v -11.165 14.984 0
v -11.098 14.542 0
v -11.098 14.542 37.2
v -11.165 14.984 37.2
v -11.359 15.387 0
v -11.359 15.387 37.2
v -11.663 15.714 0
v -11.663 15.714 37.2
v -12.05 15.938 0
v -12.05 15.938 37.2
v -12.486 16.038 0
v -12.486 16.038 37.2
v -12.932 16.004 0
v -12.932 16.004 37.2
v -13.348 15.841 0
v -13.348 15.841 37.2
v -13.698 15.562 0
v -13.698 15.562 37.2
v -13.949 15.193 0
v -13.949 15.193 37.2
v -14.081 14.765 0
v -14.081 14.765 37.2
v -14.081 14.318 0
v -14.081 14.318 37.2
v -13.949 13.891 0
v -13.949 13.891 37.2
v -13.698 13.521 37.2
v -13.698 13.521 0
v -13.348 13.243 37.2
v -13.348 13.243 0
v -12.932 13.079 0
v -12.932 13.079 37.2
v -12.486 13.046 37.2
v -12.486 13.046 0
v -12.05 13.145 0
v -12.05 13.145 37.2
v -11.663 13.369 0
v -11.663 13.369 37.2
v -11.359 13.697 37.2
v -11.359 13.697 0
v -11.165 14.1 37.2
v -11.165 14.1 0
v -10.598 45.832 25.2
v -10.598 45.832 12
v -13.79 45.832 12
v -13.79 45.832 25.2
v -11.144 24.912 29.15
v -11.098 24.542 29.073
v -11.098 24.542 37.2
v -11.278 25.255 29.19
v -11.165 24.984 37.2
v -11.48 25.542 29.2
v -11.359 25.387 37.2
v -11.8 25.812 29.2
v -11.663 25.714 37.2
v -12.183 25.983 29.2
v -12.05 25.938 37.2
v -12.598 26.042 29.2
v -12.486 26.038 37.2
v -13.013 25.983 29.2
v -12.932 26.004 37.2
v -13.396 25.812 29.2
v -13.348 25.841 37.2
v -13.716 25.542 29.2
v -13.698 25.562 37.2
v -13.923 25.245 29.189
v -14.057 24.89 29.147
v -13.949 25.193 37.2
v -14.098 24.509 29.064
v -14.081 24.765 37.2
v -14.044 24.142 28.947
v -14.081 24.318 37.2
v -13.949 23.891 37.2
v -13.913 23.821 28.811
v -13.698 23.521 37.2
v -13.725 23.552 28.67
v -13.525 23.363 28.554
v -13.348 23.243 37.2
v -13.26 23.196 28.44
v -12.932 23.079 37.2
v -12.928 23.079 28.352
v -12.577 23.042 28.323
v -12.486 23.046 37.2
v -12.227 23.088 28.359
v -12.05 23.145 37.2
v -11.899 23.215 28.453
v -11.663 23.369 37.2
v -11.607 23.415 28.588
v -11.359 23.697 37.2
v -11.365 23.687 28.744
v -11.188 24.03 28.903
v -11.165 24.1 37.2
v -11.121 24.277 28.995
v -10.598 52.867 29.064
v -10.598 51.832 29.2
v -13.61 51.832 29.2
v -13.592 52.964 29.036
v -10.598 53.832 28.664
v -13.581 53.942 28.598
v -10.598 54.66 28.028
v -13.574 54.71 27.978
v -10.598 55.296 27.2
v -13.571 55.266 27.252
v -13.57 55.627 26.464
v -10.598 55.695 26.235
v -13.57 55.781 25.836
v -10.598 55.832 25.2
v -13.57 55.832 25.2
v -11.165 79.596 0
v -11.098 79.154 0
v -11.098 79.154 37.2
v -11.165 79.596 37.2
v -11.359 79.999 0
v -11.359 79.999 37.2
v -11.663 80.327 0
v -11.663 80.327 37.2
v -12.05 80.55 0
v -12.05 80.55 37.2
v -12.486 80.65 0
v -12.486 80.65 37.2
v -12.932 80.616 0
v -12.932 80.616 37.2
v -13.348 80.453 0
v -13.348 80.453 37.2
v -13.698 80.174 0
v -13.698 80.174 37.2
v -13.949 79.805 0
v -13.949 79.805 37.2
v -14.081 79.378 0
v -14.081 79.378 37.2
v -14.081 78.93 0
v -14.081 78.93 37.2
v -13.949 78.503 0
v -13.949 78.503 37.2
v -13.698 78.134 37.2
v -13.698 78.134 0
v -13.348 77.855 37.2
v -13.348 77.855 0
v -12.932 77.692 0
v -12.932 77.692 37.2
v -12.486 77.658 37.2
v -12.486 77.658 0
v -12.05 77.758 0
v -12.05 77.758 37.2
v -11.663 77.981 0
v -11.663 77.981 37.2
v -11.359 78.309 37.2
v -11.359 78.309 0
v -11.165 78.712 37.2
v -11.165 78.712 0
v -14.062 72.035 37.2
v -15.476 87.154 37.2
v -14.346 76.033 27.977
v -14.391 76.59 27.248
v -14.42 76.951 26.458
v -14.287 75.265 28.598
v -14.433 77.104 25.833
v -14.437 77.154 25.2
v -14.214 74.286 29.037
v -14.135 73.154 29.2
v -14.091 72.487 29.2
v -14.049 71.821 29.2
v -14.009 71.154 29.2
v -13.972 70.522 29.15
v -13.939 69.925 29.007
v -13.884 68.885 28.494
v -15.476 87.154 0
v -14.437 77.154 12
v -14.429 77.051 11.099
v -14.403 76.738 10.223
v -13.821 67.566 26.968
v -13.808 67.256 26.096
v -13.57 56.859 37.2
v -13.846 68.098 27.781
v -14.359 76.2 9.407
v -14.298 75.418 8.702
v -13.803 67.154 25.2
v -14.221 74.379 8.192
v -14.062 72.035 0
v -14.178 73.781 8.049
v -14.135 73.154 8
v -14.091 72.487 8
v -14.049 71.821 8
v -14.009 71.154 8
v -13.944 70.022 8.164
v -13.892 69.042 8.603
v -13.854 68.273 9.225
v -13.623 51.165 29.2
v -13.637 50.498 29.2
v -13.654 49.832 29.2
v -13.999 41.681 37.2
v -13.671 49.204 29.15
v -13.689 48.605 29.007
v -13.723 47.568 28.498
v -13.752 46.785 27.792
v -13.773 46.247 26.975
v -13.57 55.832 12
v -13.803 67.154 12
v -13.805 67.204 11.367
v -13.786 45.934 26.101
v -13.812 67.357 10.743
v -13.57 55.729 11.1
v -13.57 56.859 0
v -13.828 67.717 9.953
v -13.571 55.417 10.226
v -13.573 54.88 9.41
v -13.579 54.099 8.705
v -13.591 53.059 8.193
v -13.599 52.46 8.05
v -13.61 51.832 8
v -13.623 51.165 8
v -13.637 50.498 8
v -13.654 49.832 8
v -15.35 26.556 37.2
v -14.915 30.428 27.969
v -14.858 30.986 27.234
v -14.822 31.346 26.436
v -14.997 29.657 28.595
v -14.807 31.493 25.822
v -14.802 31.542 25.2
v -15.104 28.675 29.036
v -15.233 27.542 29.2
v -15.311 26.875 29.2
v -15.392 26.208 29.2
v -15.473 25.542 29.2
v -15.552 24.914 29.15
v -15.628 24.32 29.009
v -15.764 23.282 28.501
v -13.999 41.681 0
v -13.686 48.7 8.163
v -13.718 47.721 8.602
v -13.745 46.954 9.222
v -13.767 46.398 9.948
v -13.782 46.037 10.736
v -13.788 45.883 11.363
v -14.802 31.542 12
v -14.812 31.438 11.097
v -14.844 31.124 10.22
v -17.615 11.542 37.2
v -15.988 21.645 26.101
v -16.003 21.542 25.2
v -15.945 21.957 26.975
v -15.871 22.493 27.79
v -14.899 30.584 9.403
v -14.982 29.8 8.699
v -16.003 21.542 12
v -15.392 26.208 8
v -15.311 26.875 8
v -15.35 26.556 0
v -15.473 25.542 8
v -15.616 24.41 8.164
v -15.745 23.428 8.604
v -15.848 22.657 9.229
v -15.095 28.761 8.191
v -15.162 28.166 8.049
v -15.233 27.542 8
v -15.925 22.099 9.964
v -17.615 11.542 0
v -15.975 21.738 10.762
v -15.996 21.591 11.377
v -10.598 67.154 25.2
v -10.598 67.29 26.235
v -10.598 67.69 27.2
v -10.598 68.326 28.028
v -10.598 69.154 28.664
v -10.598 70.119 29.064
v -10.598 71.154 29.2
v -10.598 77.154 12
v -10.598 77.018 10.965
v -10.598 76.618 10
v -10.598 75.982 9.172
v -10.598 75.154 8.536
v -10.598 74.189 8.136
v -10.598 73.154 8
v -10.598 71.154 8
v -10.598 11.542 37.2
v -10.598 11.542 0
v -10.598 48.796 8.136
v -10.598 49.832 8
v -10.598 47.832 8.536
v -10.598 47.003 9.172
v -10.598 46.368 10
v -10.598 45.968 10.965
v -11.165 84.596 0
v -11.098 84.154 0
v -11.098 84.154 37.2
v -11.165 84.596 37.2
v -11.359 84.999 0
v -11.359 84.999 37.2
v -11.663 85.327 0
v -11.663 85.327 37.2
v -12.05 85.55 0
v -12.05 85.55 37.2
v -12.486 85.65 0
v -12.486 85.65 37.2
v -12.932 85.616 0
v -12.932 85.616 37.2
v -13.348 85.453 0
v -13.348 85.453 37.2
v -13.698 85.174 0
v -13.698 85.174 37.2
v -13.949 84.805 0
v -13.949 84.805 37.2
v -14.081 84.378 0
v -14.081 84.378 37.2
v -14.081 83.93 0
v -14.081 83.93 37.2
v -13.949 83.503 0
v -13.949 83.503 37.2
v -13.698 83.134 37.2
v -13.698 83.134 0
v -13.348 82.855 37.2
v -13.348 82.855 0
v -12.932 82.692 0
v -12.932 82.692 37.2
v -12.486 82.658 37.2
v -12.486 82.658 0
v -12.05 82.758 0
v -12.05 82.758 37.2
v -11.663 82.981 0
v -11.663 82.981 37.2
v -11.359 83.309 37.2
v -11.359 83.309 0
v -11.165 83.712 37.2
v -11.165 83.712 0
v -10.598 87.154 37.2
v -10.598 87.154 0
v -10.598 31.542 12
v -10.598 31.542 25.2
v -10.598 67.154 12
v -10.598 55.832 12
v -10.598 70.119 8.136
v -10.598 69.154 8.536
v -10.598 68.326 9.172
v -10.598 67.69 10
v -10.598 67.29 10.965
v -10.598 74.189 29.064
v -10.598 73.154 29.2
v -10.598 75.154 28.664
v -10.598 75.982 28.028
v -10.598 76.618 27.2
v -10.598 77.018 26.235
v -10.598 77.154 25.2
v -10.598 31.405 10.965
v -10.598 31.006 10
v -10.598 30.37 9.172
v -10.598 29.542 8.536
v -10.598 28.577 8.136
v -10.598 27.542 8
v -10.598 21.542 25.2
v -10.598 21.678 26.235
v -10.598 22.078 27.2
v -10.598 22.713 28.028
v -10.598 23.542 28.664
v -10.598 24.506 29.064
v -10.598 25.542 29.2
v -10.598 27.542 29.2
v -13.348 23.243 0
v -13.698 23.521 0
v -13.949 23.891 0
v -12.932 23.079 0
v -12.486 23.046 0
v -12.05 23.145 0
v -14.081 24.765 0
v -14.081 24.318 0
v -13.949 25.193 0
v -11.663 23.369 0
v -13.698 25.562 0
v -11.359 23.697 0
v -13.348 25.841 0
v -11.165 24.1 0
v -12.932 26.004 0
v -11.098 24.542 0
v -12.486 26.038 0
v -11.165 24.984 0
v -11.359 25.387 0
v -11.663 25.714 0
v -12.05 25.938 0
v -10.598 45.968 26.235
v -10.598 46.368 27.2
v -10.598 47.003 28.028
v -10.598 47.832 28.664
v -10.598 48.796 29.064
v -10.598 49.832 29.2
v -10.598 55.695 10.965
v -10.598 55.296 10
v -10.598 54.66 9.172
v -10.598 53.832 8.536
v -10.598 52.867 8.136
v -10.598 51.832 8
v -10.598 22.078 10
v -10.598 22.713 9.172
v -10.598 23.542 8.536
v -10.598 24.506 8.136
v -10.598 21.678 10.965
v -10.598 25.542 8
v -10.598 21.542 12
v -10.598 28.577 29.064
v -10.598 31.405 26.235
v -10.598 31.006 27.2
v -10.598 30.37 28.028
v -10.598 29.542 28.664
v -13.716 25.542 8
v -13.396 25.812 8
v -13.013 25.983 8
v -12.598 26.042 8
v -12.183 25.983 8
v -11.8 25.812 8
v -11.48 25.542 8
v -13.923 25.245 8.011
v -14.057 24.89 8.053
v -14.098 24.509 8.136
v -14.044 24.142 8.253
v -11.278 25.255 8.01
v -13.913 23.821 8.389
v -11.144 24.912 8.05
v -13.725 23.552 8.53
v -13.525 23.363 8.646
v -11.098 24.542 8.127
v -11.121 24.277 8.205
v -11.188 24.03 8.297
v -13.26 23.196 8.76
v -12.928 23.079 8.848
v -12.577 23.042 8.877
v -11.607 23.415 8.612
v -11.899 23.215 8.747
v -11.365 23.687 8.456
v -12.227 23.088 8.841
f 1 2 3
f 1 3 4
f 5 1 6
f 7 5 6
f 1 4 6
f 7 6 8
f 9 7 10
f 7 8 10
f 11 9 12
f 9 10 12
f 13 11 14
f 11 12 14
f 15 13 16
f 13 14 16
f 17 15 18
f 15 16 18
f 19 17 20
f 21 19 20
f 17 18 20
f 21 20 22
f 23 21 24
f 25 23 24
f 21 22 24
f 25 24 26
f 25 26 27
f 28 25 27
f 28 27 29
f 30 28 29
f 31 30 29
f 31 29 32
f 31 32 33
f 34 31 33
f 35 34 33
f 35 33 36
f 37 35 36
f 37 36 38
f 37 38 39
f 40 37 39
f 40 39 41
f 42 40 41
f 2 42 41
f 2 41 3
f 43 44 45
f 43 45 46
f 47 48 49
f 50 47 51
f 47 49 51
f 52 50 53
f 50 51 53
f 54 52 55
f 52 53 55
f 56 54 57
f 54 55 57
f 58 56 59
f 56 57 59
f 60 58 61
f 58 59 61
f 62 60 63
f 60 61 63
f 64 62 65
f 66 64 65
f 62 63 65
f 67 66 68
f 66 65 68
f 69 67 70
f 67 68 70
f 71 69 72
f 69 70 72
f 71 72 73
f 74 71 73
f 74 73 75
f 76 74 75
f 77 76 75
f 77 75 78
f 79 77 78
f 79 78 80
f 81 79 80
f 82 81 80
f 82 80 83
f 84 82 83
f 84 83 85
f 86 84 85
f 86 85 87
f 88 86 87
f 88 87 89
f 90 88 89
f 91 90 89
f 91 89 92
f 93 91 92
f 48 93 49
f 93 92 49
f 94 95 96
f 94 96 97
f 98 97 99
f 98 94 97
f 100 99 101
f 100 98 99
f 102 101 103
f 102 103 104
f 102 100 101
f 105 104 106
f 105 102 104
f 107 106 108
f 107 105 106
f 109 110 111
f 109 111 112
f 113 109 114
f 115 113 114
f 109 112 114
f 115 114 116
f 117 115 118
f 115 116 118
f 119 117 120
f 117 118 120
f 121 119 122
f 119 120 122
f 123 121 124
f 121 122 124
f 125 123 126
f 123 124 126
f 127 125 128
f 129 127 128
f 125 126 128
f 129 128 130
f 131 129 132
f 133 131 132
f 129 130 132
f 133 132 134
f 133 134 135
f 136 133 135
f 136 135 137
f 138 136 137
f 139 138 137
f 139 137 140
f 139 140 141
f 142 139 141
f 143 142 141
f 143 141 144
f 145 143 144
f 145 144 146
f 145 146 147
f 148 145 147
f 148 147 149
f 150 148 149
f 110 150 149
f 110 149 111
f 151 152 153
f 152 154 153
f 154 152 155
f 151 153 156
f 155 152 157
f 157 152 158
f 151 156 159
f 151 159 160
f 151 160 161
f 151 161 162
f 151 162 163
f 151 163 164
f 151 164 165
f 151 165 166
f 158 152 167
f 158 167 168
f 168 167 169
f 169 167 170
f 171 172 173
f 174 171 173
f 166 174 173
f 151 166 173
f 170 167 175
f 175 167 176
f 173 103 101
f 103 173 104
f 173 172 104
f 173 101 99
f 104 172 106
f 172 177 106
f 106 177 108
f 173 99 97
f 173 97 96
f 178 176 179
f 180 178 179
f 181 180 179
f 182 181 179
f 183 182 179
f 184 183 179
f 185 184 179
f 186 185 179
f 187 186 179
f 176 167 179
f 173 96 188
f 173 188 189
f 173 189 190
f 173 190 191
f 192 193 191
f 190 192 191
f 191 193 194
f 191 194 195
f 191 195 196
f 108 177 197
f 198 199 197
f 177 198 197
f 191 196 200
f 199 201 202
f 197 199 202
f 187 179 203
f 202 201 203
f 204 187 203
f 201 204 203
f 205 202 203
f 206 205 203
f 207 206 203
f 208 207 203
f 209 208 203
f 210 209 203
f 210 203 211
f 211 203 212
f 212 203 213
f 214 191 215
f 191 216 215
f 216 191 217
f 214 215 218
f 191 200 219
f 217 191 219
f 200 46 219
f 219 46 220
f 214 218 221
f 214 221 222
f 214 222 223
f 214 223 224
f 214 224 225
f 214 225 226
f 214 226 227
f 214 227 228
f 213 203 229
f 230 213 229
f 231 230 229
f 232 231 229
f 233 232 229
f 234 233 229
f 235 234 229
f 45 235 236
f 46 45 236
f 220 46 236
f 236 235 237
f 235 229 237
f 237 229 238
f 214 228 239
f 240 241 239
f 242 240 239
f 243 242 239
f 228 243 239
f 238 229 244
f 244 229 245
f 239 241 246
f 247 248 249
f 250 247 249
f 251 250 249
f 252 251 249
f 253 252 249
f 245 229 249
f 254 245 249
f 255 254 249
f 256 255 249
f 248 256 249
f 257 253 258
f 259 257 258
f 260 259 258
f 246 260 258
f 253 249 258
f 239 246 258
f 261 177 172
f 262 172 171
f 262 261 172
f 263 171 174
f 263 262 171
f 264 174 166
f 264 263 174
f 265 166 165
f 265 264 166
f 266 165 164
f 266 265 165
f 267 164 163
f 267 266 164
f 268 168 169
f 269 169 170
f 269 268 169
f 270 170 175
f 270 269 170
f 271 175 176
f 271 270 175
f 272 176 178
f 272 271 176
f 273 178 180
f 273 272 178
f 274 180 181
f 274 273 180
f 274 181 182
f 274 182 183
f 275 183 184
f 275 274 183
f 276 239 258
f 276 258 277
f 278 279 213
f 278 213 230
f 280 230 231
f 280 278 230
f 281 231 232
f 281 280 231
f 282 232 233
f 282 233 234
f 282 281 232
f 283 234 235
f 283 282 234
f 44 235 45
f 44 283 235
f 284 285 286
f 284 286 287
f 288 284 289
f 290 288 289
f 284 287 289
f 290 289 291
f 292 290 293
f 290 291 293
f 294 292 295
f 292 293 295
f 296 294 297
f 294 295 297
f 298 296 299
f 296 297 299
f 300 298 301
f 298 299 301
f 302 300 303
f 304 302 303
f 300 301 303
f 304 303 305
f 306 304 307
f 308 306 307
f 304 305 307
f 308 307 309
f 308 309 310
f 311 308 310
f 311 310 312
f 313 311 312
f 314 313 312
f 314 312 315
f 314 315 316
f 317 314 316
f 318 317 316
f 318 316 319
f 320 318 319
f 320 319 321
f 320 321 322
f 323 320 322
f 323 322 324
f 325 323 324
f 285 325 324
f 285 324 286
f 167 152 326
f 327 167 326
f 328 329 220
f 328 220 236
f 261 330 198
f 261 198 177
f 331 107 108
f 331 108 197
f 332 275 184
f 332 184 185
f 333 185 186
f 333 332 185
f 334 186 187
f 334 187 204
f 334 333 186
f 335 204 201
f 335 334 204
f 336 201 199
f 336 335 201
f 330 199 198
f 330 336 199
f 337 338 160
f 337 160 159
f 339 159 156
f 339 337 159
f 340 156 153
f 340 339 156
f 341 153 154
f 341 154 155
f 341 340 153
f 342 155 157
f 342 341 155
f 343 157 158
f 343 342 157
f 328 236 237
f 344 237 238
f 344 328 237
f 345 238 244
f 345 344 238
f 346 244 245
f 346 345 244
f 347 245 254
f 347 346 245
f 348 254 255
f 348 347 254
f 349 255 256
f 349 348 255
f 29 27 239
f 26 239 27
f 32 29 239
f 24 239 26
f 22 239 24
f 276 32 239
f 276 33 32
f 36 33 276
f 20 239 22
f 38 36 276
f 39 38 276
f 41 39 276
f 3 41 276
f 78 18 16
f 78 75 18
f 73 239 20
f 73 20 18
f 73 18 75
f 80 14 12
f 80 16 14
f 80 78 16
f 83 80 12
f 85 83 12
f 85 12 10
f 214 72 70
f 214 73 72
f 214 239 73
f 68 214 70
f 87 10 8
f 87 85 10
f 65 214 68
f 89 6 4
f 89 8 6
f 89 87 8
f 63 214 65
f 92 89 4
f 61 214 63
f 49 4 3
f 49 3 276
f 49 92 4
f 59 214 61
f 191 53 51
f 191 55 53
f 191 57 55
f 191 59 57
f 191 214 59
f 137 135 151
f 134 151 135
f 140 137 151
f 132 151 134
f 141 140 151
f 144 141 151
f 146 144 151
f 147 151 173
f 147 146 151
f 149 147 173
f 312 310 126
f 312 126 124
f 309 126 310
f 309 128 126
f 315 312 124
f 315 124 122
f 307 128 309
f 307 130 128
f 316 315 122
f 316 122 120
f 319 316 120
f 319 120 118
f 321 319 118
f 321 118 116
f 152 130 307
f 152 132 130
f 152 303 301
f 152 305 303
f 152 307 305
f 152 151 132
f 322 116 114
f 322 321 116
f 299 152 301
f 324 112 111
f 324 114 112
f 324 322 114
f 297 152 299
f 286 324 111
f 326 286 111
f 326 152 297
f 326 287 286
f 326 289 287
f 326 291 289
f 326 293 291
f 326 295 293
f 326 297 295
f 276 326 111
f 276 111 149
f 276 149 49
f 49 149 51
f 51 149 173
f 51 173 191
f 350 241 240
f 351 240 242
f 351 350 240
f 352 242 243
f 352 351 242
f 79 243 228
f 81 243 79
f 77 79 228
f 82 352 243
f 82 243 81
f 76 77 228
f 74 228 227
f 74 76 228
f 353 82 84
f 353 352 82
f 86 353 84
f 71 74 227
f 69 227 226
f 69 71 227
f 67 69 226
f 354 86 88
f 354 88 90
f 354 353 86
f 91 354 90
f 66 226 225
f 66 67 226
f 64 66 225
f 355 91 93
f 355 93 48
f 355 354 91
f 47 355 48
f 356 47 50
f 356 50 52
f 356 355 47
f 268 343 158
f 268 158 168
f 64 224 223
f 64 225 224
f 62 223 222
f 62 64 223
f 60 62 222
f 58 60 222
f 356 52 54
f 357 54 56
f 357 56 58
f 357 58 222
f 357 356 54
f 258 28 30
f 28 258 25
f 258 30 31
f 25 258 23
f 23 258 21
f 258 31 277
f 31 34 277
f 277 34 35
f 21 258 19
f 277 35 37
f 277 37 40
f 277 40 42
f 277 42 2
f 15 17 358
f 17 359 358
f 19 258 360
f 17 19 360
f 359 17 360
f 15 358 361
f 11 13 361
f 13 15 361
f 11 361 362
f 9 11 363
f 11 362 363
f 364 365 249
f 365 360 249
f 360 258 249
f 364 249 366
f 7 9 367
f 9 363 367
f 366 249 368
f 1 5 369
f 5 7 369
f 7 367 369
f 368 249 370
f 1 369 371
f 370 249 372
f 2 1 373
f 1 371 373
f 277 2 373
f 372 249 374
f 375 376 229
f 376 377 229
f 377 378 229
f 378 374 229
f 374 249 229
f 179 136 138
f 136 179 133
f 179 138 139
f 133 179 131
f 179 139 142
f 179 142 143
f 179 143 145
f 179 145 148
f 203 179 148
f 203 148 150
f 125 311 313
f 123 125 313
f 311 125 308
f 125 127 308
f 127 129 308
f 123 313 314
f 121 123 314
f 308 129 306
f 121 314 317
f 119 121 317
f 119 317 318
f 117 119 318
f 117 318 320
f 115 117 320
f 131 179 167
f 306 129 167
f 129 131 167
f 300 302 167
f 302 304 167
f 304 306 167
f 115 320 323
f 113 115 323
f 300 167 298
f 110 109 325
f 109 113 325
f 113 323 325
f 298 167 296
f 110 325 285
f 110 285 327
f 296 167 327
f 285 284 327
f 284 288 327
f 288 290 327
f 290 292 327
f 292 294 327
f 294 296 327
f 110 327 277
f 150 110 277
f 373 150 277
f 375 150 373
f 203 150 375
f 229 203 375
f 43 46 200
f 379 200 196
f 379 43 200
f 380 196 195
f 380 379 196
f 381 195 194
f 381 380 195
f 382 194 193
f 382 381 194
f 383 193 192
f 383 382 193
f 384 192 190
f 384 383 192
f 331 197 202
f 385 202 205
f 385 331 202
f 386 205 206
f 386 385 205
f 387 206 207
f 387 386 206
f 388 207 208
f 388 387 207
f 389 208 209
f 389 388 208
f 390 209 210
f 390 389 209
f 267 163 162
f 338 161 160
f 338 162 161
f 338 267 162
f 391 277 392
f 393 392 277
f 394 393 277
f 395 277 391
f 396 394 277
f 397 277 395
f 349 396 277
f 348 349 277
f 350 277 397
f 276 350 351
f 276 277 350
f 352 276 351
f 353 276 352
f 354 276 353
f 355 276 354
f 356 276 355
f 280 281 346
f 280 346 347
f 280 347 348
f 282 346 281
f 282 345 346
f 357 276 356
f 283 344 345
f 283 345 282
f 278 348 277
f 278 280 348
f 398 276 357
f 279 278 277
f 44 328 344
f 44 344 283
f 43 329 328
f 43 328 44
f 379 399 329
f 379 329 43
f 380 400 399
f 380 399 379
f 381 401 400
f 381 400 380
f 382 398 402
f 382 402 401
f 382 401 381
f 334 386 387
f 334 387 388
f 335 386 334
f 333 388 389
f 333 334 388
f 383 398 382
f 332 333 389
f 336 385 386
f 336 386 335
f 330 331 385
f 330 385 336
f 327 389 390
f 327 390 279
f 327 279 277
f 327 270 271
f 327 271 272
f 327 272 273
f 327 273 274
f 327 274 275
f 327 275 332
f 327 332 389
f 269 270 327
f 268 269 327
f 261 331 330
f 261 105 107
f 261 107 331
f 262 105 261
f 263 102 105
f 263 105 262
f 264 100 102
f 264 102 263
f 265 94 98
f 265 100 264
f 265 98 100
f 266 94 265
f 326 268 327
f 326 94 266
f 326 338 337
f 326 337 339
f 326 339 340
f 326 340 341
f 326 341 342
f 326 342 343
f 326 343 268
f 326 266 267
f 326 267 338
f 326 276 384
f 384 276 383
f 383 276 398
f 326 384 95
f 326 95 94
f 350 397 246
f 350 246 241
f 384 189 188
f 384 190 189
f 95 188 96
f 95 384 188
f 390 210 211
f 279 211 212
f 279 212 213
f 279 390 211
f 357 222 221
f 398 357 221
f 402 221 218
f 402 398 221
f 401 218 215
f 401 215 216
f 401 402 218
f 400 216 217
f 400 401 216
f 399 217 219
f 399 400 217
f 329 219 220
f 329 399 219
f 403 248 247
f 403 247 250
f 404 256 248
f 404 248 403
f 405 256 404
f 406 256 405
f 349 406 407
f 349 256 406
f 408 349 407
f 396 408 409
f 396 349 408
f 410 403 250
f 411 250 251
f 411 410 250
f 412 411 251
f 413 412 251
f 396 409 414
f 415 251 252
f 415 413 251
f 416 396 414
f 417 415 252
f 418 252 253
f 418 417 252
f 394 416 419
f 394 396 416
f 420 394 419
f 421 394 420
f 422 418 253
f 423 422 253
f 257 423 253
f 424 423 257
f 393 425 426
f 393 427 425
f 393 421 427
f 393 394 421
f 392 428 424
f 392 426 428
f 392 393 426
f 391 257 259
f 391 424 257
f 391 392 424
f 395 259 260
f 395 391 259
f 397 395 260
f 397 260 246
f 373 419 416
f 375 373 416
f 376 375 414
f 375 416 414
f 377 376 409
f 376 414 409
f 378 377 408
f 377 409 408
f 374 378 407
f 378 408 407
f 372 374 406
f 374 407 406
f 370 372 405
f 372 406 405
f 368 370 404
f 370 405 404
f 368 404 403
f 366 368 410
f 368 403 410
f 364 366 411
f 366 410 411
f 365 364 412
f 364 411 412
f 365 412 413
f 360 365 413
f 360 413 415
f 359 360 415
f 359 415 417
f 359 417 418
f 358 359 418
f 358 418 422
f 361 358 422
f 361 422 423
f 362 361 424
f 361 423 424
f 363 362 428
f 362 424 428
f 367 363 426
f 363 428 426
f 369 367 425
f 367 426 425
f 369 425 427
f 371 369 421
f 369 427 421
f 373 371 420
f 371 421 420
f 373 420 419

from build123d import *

# Parameters (mm, degrees)
RESSALTO_EXTRUS_O1_DEPTH = 37.2
FILETE3_R                = 10
FILETE4_R                = 10
ESBO_O3_W                = 64.493903811
ESBO_O3_H                = 22.028162523
CORTE_EXTRUS_O2_DEPTH    = 126.622328301
ESBO_O4_W                = 55.088928671
ESBO_O4_H                = 123.119514717
CORTE_EXTRUS_O3_DEPTH    = 126.622328159
ESBO_O5_W                = 12.155718474
ESBO_O5_H                = 25
CORTE_EXTRUS_O4_DEPTH    = 120.46824597
CORTE_EXTRUS_O5_DEPTH    = 96.020543125
ESBO_O7_R                = 1.5
CORTE_EXTRUS_O6_DEPTH    = 97.384450815


with BuildPart() as part:
    # Esboço1 → Ressalto-extrusão1 (new body)
    with BuildSketch(Plane.XY):
        with BuildLine():
            ThreePointArc((-10, 0), (0, -10), (10, 0))
            Line((10, 0), (20, 0))
            ThreePointArc((20, 0), (14.071698091, 40.495175194), (14.829943665, 81.414963086))
            ThreePointArc((14.829943665, 81.414963086), (11.193742071, 116.066691762), (-16.576524471, 95.024435265))
            Line((-16.576524471, 95.024435265), (-16.487894969, 94.437265709))
            Line((-16.487894969, 94.437265709), (-16.369382775, 93.652123615))
            ThreePointArc((-16.369382775, 93.652123615), (-13.756795166, 46.654405302), (-20, 0))
            Line((-20, 0), (-10, 0))
        make_face()
    extrude(amount=RESSALTO_EXTRUS_O1_DEPTH)

    # Filete3
    # the kernel refuses this fillet: 10 mm, written as the material it takes off along each edge
    with BuildSketch(Plane(origin=(20, 0, -29.463728433), x_dir=(-0.20232831186330175, 0.9793177493635794, 0), z_dir=(0, 0, 1))) as filete3_piece_1:
        with BuildLine():
            CenterArc((12.021201201, 9.997221658), FILETE3_R, 181.169168083, 87.480189)
            Line((2.023283119, 9.793177494), (1.823324757, 9.78909661))
            ThreePointArc((1.823324757, 9.78909661), (0.815778009, 4.937054409), (-0.19586355, 0.040465662))
            Line((-0.19586355, 0.040465662), (0.004714197, -0.199944433))
            ThreePointArc((0.004714197, -0.199944433), (5.892745687, -0.130541448), (11.780777177, -0.199944433))
            Line((11.780777177, -0.199944433), (11.785491373, 0))
        make_face()
    extrude(amount=96.127456867, mode=Mode.SUBTRACT)
    with BuildSketch(Plane(origin=(-20, 0, -29.463728433), x_dir=(1, 0, 0), z_dir=(0, 0, 1))) as filete3_piece_2:
        with BuildLine():
            CenterArc((12.222685959, 9.749854723), FILETE3_R, 169.67749742, 87.480189)
            Line((2.384538574, 11.541740887), (2.187775626, 11.57757861))
            ThreePointArc((2.187775626, 11.57757861), (1.06442773, 5.797282674), (-0.194855317, 0.045071116))
            Line((-0.194855317, 0.045071116), (0, -0.2))
            ThreePointArc((0, -0.2), (5, -0.2), (9.955546281, -0.194997094))
            Line((9.955546281, -0.194997094), (10, 0))
        make_face()
    extrude(amount=96.127456867, mode=Mode.SUBTRACT)

    # Filete4
    filete4_edges = [part.edges().sort_by_distance(p)[0] for p in [
        (10, 0, 18.6),
        (-10, 0, 18.6),
    ]]
    fillet(filete4_edges, radius=FILETE4_R)

    # Esboço3 → Corte-extrusão2 (cut, through all)
    with BuildSketch(Plane.XY.offset(37.2)):
        with Locations((-2.119172362, 0.527659626)):
            Rectangle(ESBO_O3_W, ESBO_O3_H)
    extrude(amount=-CORTE_EXTRUS_O2_DEPTH, mode=Mode.SUBTRACT)

    # Esboço4 → Corte-extrusão3 (cut, through all)
    with BuildSketch(Plane.XY.offset(37.2)):
        with Locations((16.946535692, 73.101498246)):
            Rectangle(ESBO_O4_W, ESBO_O4_H)
    extrude(amount=-CORTE_EXTRUS_O3_DEPTH, mode=Mode.SUBTRACT)

    # Esboço5 → Corte-extrusão4 (cut, through all)
    with BuildSketch(Plane.XY.offset(37.2)):
        with Locations((-16.675787881, 99.653989291)):
            Rectangle(ESBO_O5_W, ESBO_O5_H)
    extrude(amount=-CORTE_EXTRUS_O4_DEPTH, mode=Mode.SUBTRACT)

    # Esboço6 → Corte-extrusão5 (cut, through all)
    with BuildSketch(Plane(origin=(-10.597928644, 0, 0), x_dir=(0, 0, -1), z_dir=(1, 0, 0))):
        with BuildLine():
            Line((-25.2, 77.153989291), (-12, 77.153989291))
            ThreePointArc((-12, 77.153989291), (-9.171572875, 75.982416416), (-8, 73.153989291))
            Line((-8, 73.153989291), (-8, 71.153989291))
            ThreePointArc((-8, 71.153989291), (-9.171572875, 68.325562166), (-12, 67.153989291))
            Line((-12, 67.153989291), (-25.2, 67.153989291))
            ThreePointArc((-25.2, 67.153989291), (-28.028427125, 68.325562166), (-29.2, 71.153989291))
            Line((-29.2, 71.153989291), (-29.2, 73.153989291))
            ThreePointArc((-29.2, 73.153989291), (-28.028427125, 75.982416416), (-25.2, 77.153989291))
        make_face()
        with BuildLine():
            Line((-25.2, 55.831740887), (-12, 55.831740887))
            ThreePointArc((-12, 55.831740887), (-9.171572875, 54.660168012), (-8, 51.831740887))
            Line((-8, 51.831740887), (-8, 49.831740887))
            ThreePointArc((-8, 49.831740887), (-9.171572875, 47.003313762), (-12, 45.831740887))
            Line((-12, 45.831740887), (-25.2, 45.831740887))
            ThreePointArc((-25.2, 45.831740887), (-28.028427125, 47.003313762), (-29.2, 49.831740887))
            Line((-29.2, 49.831740887), (-29.2, 51.831740887))
            ThreePointArc((-29.2, 51.831740887), (-28.028427125, 54.660168012), (-25.2, 55.831740887))
        make_face()
        with BuildLine():
            Line((-25.2, 31.541740887), (-12, 31.541740887))
            ThreePointArc((-12, 31.541740887), (-9.171572875, 30.370168012), (-8, 27.541740887))
            Line((-8, 27.541740887), (-8, 25.541740887))
            ThreePointArc((-8, 25.541740887), (-9.171572875, 22.713313762), (-12, 21.541740887))
            Line((-12, 21.541740887), (-25.2, 21.541740887))
            ThreePointArc((-25.2, 21.541740887), (-28.028427125, 22.713313762), (-29.2, 25.541740887))
            Line((-29.2, 25.541740887), (-29.2, 27.541740887))
            ThreePointArc((-29.2, 27.541740887), (-28.028427125, 30.370168012), (-25.2, 31.541740887))
        make_face()
    extrude(amount=-CORTE_EXTRUS_O5_DEPTH, mode=Mode.SUBTRACT)

    # Esboço7 → Corte-extrusão6 (cut, through all)
    with BuildSketch(Plane.XY.offset(37.2)):
        with Locations((-12.597928644, 14.541740887)):
            Circle(ESBO_O7_R)
        with Locations((-12.597928644, 84.153989291)):
            Circle(ESBO_O7_R)
        with Locations((-12.597928644, 79.153989291)):
            Circle(ESBO_O7_R)
        with Locations((-12.597928644, 24.541740887)):
            Circle(ESBO_O7_R)
    extrude(amount=-CORTE_EXTRUS_O6_DEPTH, mode=Mode.SUBTRACT)


solid = part.part
